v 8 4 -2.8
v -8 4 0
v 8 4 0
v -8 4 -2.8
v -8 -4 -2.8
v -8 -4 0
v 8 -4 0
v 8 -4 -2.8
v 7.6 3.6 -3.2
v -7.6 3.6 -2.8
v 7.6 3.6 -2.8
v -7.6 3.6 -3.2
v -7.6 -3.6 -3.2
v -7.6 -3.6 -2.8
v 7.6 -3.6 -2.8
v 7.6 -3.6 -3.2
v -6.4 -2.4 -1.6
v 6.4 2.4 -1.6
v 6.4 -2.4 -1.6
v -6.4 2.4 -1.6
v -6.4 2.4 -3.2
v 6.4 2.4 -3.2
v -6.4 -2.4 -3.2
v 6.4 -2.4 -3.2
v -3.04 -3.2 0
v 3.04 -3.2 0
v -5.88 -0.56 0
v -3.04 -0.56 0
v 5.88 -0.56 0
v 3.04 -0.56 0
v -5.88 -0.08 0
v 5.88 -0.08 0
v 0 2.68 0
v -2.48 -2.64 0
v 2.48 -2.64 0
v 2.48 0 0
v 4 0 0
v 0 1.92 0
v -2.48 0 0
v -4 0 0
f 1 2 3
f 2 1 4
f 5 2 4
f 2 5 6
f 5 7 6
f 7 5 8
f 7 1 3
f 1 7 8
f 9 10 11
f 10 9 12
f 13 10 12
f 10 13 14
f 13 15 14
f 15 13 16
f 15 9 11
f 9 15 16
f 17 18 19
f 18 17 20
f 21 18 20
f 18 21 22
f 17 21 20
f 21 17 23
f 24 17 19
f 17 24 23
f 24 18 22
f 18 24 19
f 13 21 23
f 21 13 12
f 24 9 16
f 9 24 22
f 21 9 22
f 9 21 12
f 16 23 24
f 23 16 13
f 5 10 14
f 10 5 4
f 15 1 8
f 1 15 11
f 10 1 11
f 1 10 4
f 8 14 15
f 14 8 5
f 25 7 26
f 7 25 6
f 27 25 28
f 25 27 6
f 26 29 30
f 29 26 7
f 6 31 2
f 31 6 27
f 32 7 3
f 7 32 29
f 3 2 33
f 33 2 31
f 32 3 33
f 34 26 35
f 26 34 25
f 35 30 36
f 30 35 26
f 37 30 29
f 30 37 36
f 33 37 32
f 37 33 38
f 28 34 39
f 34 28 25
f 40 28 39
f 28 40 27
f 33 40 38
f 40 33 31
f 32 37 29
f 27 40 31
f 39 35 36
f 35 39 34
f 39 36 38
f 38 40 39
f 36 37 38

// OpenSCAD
// file: ../p/box5.scad
use <../lib.scad>
function ldraw_lib__box5() = [
// 0 Box with 5 Faces and All Edges
// 0 Name: box5.dat
// 0 Author: James Jessiman
// 0 !LDRAW_ORG Primitive UPDATE 2012-01
// 0 !LICENSE Licensed under CC BY 4.0 : see CAreadme.txt
// 
// 0 BFC CERTIFY CCW
  [0,"BFC","CERTIFY"],
  [0,"BFC","CCW"],
// 
// 0 !HISTORY 2002-04-03 [sbliss] Modified for BFC compliance
// 0 !HISTORY 2002-04-25 [PTadmin] Official Update 2002-02
// 0 !HISTORY 2007-06-24 [PTadmin] Header formatted for Contributor Agreement
// 0 !HISTORY 2008-07-01 [PTadmin] Official Update 2008-01
// 0 !HISTORY 2012-02-16 [Philo] Changed to CCW
// 0 !HISTORY 2012-03-30 [PTadmin] Official Update 2012-01
// 
// 
// 2 24 1 1 1 -1 1 1
  [2,24,1,1,1,-1,1,1],
// 2 24 -1 1 1 -1 1 -1
  [2,24,-1,1,1,-1,1,-1],
// 2 24 -1 1 -1 1 1 -1
  [2,24,-1,1,-1,1,1,-1],
// 2 24 1 1 -1 1 1 1
  [2,24,1,1,-1,1,1,1],
// 2 24 1 0 1 -1 0 1
  [2,24,1,0,1,-1,0,1],
// 2 24 -1 0 1 -1 0 -1
  [2,24,-1,0,1,-1,0,-1],
// 2 24 -1 0 -1 1 0 -1
  [2,24,-1,0,-1,1,0,-1],
// 2 24 1 0 -1 1 0 1
  [2,24,1,0,-1,1,0,1],
// 2 24 1 0 1 1 1 1
  [2,24,1,0,1,1,1,1],
// 2 24 -1 0 1 -1 1 1
  [2,24,-1,0,1,-1,1,1],
// 2 24 1 0 -1 1 1 -1
  [2,24,1,0,-1,1,1,-1],
// 2 24 -1 0 -1 -1 1 -1
  [2,24,-1,0,-1,-1,1,-1],
// 4 16 -1 1 1 1 1 1 1 1 -1 -1 1 -1
  [4,16,-1,1,1,1,1,1,1,1,-1,-1,1,-1],
// 4 16 -1 1 1 -1 0 1 1 0 1 1 1 1
  [4,16,-1,1,1,-1,0,1,1,0,1,1,1,1],
// 4 16 -1 1 -1 -1 0 -1 -1 0 1 -1 1 1
  [4,16,-1,1,-1,-1,0,-1,-1,0,1,-1,1,1],
// 4 16 1 1 -1 1 0 -1 -1 0 -1 -1 1 -1
  [4,16,1,1,-1,1,0,-1,-1,0,-1,-1,1,-1],
// 4 16 1 1 1 1 0 1 1 0 -1 1 1 -1
  [4,16,1,1,1,1,0,1,1,0,-1,1,1,-1],
];
module ldraw_lib__box5(step=0, col=false, unit=2/5, alt=false, line=0.2, solid=!$preview)
    makepoly(ldraw_lib__box5(), step=step, col=col, unit=unit, alt=alt, line=line, solid=solid);
ldraw_lib__box5(line=0.2);
// file: ../p/box4.scad
use <../lib.scad>
function ldraw_lib__box4() = [
// 0 Box with 4 Faces (2 Parallel Pairs) and All Edges
// 0 Name: box4.dat
// 0 Author: James Jessiman
// 0 !LDRAW_ORG Primitive UPDATE 2012-01
// 0 !LICENSE Licensed under CC BY 4.0 : see CAreadme.txt
// 
// 0 BFC CERTIFY CCW
  [0,"BFC","CERTIFY"],
  [0,"BFC","CCW"],
// 
// 0 !HISTORY 2002-04-03 [sbliss] Modified for BFC compliance
// 0 !HISTORY 2002-04-25 [PTadmin] Official Update 2002-02
// 0 !HISTORY 2007-06-24 [PTadmin] Header formatted for Contributor Agreement
// 0 !HISTORY 2008-07-01 [PTadmin] Official Update 2008-01
// 0 !HISTORY 2012-02-16 [Philo] Changed to CCW
// 0 !HISTORY 2012-03-30 [PTadmin] Official Update 2012-01
// 
// 
// 2 24 1 1 1 -1 1 1
  [2,24,1,1,1,-1,1,1],
// 2 24 -1 1 1 -1 1 -1
  [2,24,-1,1,1,-1,1,-1],
// 2 24 -1 1 -1 1 1 -1
  [2,24,-1,1,-1,1,1,-1],
// 2 24 1 1 -1 1 1 1
  [2,24,1,1,-1,1,1,1],
// 2 24 1 0 1 -1 0 1
  [2,24,1,0,1,-1,0,1],
// 2 24 -1 0 1 -1 0 -1
  [2,24,-1,0,1,-1,0,-1],
// 2 24 -1 0 -1 1 0 -1
  [2,24,-1,0,-1,1,0,-1],
// 2 24 1 0 -1 1 0 1
  [2,24,1,0,-1,1,0,1],
// 2 24 1 0 1 1 1 1
  [2,24,1,0,1,1,1,1],
// 2 24 -1 0 1 -1 1 1
  [2,24,-1,0,1,-1,1,1],
// 2 24 1 0 -1 1 1 -1
  [2,24,1,0,-1,1,1,-1],
// 2 24 -1 0 -1 -1 1 -1
  [2,24,-1,0,-1,-1,1,-1],
// 4 16 -1 1 1 -1 0 1 1 0 1 1 1 1
  [4,16,-1,1,1,-1,0,1,1,0,1,1,1,1],
// 4 16 -1 1 -1 -1 0 -1 -1 0 1 -1 1 1
  [4,16,-1,1,-1,-1,0,-1,-1,0,1,-1,1,1],
// 4 16 1 1 -1 1 0 -1 -1 0 -1 -1 1 -1
  [4,16,1,1,-1,1,0,-1,-1,0,-1,-1,1,-1],
// 4 16 1 1 1 1 0 1 1 0 -1 1 1 -1
  [4,16,1,1,1,1,0,1,1,0,-1,1,1,-1],
];
module ldraw_lib__box4(step=0, col=false, unit=2/5, alt=false, line=0.2, solid=!$preview)
    makepoly(ldraw_lib__box4(), step=step, col=col, unit=unit, alt=alt, line=line, solid=solid);
ldraw_lib__box4(line=0.2);
// file: s/3069p13c.scad
use <../../lib.scad>
function ldraw_lib__s__3069p13c() = [
// 0 ~Tile  1 x  2 with Arrow Short Pattern - Arrow
// 0 Name: s\3069p13c.dat
// 0 Author: Alex Taylor [anathema]
// 0 !LDRAW_ORG Subpart UPDATE 2010-02
// 0 !LICENSE Licensed under CC BY 2.0 and CC BY 4.0 : see CAreadme.txt
// 
// 0 BFC CERTIFY CCW
  [0,"BFC","CERTIFY"],
  [0,"BFC","CCW"],
// 
// 0 !HISTORY 2010-07-05 [PTadmin] Official Update 2010-02
// 
// 
// 4 16 -6.2 0 -6.6 6.2 0 -6.6 6.2 0 0 -6.2 0 0
  [4,16,-6.2,0,-6.6,6.2,0,-6.6,6.2,0,0,-6.2,0,0],
// 3 16 -6.2 0 0 6.2 0 0 0 0 4.8
  [3,16,-6.2,0,0,6.2,0,0,0,0,4.8],
// 3 16 0 0 4.8 -10 0 0 -6.2 0 0
  [3,16,0,0,4.8,-10,0,0,-6.2,0,0],
// 3 16 6.2 0 0 10 0 0 0 0 4.8
  [3,16,6.2,0,0,10,0,0,0,0,4.8],
// 0
];
module ldraw_lib__s__3069p13c(step=0, col=false, unit=2/5, alt=false, line=0.2, solid=!$preview)
    makepoly(ldraw_lib__s__3069p13c(), step=step, col=col, unit=unit, alt=alt, line=line, solid=solid);
ldraw_lib__s__3069p13c(line=0.2);
// file: s/3069p13b.scad
use <../../lib.scad>
function ldraw_lib__s__3069p13b() = [
// 0 ~Tile  1 x  2 with Arrow Short Pattern - Border
// 0 Name: s\3069p13b.dat
// 0 Author: Alex Taylor [anathema]
// 0 !LDRAW_ORG Subpart UPDATE 2010-02
// 0 !LICENSE Licensed under CC BY 2.0 and CC BY 4.0 : see CAreadme.txt
// 
// 0 BFC CERTIFY CCW
  [0,"BFC","CERTIFY"],
  [0,"BFC","CCW"],
// 
// 0 !HISTORY 2010-07-05 [PTadmin] Official Update 2010-02
// 
// 
// 4 16 -7.6 0 -8 7.6 0 -8 6.2 0 -6.6 -6.2 0 -6.6
  [4,16,-7.6,0,-8,7.6,0,-8,6.2,0,-6.6,-6.2,0,-6.6],
// 4 16 6.2 0 0 6.2 0 -6.6 7.6 0 -8 7.6 0 -1.4
  [4,16,6.2,0,0,6.2,0,-6.6,7.6,0,-8,7.6,0,-1.4],
// 4 16 7.6 0 -1.4 14.7 0 -1.4 10 0 0 6.2 0 0
  [4,16,7.6,0,-1.4,14.7,0,-1.4,10,0,0,6.2,0,0],
// 4 16 0 0 4.8 10 0 0 14.7 0 -0.2 0 0 6.7
  [4,16,0,0,4.8,10,0,0,14.7,0,-0.2,0,0,6.7],
// 4 16 -7.6 0 -1.4 -7.6 0 -8 -6.2 0 -6.6 -6.2 0 0
  [4,16,-7.6,0,-1.4,-7.6,0,-8,-6.2,0,-6.6,-6.2,0,0],
// 4 16 -6.2 0 0 -10 0 0 -14.7 0 -1.4 -7.6 0 -1.4
  [4,16,-6.2,0,0,-10,0,0,-14.7,0,-1.4,-7.6,0,-1.4],
// 4 16 0 0 6.7 -14.7 0 -0.2 -10 0 0 0 0 4.8
  [4,16,0,0,6.7,-14.7,0,-0.2,-10,0,0,0,0,4.8],
// 3 16 14.7 0 -0.2 10 0 0 14.7 0 -1.4
  [3,16,14.7,0,-0.2,10,0,0,14.7,0,-1.4],
// 3 16 -14.7 0 -1.4 -10 0 0 -14.7 0 -0.2
  [3,16,-14.7,0,-1.4,-10,0,0,-14.7,0,-0.2],
// 0
];
module ldraw_lib__s__3069p13b(step=0, col=false, unit=2/5, alt=false, line=0.2, solid=!$preview)
    makepoly(ldraw_lib__s__3069p13b(), step=step, col=col, unit=unit, alt=alt, line=line, solid=solid);
ldraw_lib__s__3069p13b(line=0.2);
// file: s/3069p13a.scad
use <../../lib.scad>
function ldraw_lib__s__3069p13a() = [
// 0 ~Tile  1 x  2 with Arrow Short Pattern - Mask
// 0 Name: s\3069p13a.dat
// 0 Author: Alex Taylor [anathema]
// 0 !LDRAW_ORG Subpart UPDATE 2010-02
// 0 !LICENSE Licensed under CC BY 2.0 and CC BY 4.0 : see CAreadme.txt
// 
// 0 BFC CERTIFY CCW
  [0,"BFC","CERTIFY"],
  [0,"BFC","CCW"],
// 
// 0 !HISTORY 2010-07-05 [PTadmin] Official Update 2010-02
// 
// 
// 4 16 -20 0 -10 20 0 -10 7.6 0 -8 -7.6 0 -8
  [4,16,-20,0,-10,20,0,-10,7.6,0,-8,-7.6,0,-8],
// 4 16 -7.6 0 -8 -7.6 0 -1.4 -14.7 0 -1.4 -20 0 -10
  [4,16,-7.6,0,-8,-7.6,0,-1.4,-14.7,0,-1.4,-20,0,-10],
// 4 16 20 0 -10 14.7 0 -1.4 7.6 0 -1.4 7.6 0 -8
  [4,16,20,0,-10,14.7,0,-1.4,7.6,0,-1.4,7.6,0,-8],
// 4 16 -20 0 -10 -14.7 0 -1.4 -14.7 0 -0.2 -20 0 10
  [4,16,-20,0,-10,-14.7,0,-1.4,-14.7,0,-0.2,-20,0,10],
// 4 16 20 0 10 14.7 0 -0.2 14.7 0 -1.4 20 0 -10
  [4,16,20,0,10,14.7,0,-0.2,14.7,0,-1.4,20,0,-10],
// 3 16 20 0 10 -20 0 10 0 0 6.7
  [3,16,20,0,10,-20,0,10,0,0,6.7],
// 3 16 0 0 6.7 -20 0 10 -14.7 0 -0.2
  [3,16,0,0,6.7,-20,0,10,-14.7,0,-0.2],
// 3 16 14.7 0 -0.2 20 0 10 0 0 6.7
  [3,16,14.7,0,-0.2,20,0,10,0,0,6.7],
// 0
];
module ldraw_lib__s__3069p13a(step=0, col=false, unit=2/5, alt=false, line=0.2, solid=!$preview)
    makepoly(ldraw_lib__s__3069p13a(), step=step, col=col, unit=unit, alt=alt, line=line, solid=solid);
ldraw_lib__s__3069p13a(line=0.2);
// file: s/3069bs01.scad
use <../../lib.scad>
use <../../p/box4.scad>
use <../../p/box5.scad>
function ldraw_lib__s__3069bs01() = [
// 0 ~Tile  1 x  2 with Groove without Top Face
// 0 Name: s\3069bs01.dat
// 0 Author: Santeri Piippo [arezey]
// 0 !LDRAW_ORG Subpart UPDATE 2010-02
// 0 !LICENSE Licensed under CC BY 4.0 : see CAreadme.txt
// 
// 0 BFC CERTIFY CCW
  [0,"BFC","CERTIFY"],
  [0,"BFC","CCW"],
// 
// 0 !HISTORY 2010-07-05 [PTadmin] Official Update 2010-02
// 
// 
// 1 16 0 0 0 20 0 0 0 7 0 0 0 10 box4.dat
  [1,16,0,0,0,20,0,0,0,7,0,0,0,10, ldraw_lib__box4()],
// 1 16 0 7 0 19 0 0 0 1 0 0 0 9 box4.dat
  [1,16,0,7,0,19,0,0,0,1,0,0,0,9, ldraw_lib__box4()],
// 0 BFC INVERTNEXT
  [0,"BFC","INVERTNEXT"],
// 1 16 0 8 0 16 0 0 0 -4 0 0 0 6 box5.dat
  [1,16,0,8,0,16,0,0,0,-4,0,0,0,6, ldraw_lib__box5()],
// 4 16 -19 8 9 -16 8 6 -16 8 -6 -19 8 -9
  [4,16,-19,8,9,-16,8,6,-16,8,-6,-19,8,-9],
// 4 16 19 8 -9 16 8 -6 16 8 6 19 8 9
  [4,16,19,8,-9,16,8,-6,16,8,6,19,8,9],
// 4 16 19 8 9 16 8 6 -16 8 6 -19 8 9
  [4,16,19,8,9,16,8,6,-16,8,6,-19,8,9],
// 4 16 -19 8 -9 -16 8 -6 16 8 -6 19 8 -9
  [4,16,-19,8,-9,-16,8,-6,16,8,-6,19,8,-9],
// 4 16 -20 7 10 -19 7 9 -19 7 -9 -20 7 -10
  [4,16,-20,7,10,-19,7,9,-19,7,-9,-20,7,-10],
// 4 16 20 7 -10 19 7 -9 19 7 9 20 7 10
  [4,16,20,7,-10,19,7,-9,19,7,9,20,7,10],
// 4 16 20 7 10 19 7 9 -19 7 9 -20 7 10
  [4,16,20,7,10,19,7,9,-19,7,9,-20,7,10],
// 4 16 -20 7 -10 -19 7 -9 19 7 -9 20 7 -10
  [4,16,-20,7,-10,-19,7,-9,19,7,-9,20,7,-10],
// 0 //
];
module ldraw_lib__s__3069bs01(step=0, col=false, unit=2/5, alt=false, line=0.2, solid=!$preview)
    makepoly(ldraw_lib__s__3069bs01(), step=step, col=col, unit=unit, alt=alt, line=line, solid=solid);
ldraw_lib__s__3069bs01(line=0.2);
// main file
use <../lib.scad>
use <s/3069bs01.scad>
use <s/3069p13a.scad>
use <s/3069p13b.scad>
use <s/3069p13c.scad>
function ldraw_lib__3069bp13() = [
// 0 Tile  1 x  2 with Arrow Short Yellow with Black Border Pattern
// 0 Name: 3069bp13.dat
// 0 Author: James Jessiman
// 0 !LDRAW_ORG Part UPDATE 2010-02
// 0 !LICENSE Licensed under CC BY 4.0 : see CAreadme.txt
// 
// 0 BFC CERTIFY CCW
  [0,"BFC","CERTIFY"],
  [0,"BFC","CCW"],
// 
// 0 !HISTORY 2002-08-18 [PTadmin] Official Update 2002-04
// 0 !HISTORY 2003-06-08 [jriley] BFC compliant
// 0 !HISTORY 2003-12-19 [PTadmin] Official Update 2003-03
// 0 !HISTORY 2007-06-13 [PTadmin] Header formatted for Contributor Agreement
// 0 !HISTORY 2008-07-01 [PTadmin] Official Update 2008-01
// 0 !HISTORY 2009-08-15 [anathema] Rebuilt using new subparts
// 0 !HISTORY 2010-07-05 [PTadmin] Official Update 2010-02
// 
// 
// 1 16 0 0 0 1 0 0 0 1 0 0 0 1 s\3069bs01.dat
  [1,16,0,0,0,1,0,0,0,1,0,0,0,1, ldraw_lib__s__3069bs01()],
// 1 16 0 0 0 1 0 0 0 1 0 0 0 1 s\3069p13a.dat
  [1,16,0,0,0,1,0,0,0,1,0,0,0,1, ldraw_lib__s__3069p13a()],
// 1 0 0 0 0 1 0 0 0 1 0 0 0 1 s\3069p13b.dat
  [1,0,0,0,0,1,0,0,0,1,0,0,0,1, ldraw_lib__s__3069p13b()],
// 1 14 0 0 0 1 0 0 0 1 0 0 0 1 s\3069p13c.dat
  [1,14,0,0,0,1,0,0,0,1,0,0,0,1, ldraw_lib__s__3069p13c()],
// 0
];
module ldraw_lib__3069bp13(step=0, col=false, unit=2/5, alt=false, line=0.2, solid=!$preview)
    makepoly(ldraw_lib__3069bp13(), step=step, col=col, unit=unit, alt=alt, line=line, solid=solid);
ldraw_lib__3069bp13(line=0.2);
